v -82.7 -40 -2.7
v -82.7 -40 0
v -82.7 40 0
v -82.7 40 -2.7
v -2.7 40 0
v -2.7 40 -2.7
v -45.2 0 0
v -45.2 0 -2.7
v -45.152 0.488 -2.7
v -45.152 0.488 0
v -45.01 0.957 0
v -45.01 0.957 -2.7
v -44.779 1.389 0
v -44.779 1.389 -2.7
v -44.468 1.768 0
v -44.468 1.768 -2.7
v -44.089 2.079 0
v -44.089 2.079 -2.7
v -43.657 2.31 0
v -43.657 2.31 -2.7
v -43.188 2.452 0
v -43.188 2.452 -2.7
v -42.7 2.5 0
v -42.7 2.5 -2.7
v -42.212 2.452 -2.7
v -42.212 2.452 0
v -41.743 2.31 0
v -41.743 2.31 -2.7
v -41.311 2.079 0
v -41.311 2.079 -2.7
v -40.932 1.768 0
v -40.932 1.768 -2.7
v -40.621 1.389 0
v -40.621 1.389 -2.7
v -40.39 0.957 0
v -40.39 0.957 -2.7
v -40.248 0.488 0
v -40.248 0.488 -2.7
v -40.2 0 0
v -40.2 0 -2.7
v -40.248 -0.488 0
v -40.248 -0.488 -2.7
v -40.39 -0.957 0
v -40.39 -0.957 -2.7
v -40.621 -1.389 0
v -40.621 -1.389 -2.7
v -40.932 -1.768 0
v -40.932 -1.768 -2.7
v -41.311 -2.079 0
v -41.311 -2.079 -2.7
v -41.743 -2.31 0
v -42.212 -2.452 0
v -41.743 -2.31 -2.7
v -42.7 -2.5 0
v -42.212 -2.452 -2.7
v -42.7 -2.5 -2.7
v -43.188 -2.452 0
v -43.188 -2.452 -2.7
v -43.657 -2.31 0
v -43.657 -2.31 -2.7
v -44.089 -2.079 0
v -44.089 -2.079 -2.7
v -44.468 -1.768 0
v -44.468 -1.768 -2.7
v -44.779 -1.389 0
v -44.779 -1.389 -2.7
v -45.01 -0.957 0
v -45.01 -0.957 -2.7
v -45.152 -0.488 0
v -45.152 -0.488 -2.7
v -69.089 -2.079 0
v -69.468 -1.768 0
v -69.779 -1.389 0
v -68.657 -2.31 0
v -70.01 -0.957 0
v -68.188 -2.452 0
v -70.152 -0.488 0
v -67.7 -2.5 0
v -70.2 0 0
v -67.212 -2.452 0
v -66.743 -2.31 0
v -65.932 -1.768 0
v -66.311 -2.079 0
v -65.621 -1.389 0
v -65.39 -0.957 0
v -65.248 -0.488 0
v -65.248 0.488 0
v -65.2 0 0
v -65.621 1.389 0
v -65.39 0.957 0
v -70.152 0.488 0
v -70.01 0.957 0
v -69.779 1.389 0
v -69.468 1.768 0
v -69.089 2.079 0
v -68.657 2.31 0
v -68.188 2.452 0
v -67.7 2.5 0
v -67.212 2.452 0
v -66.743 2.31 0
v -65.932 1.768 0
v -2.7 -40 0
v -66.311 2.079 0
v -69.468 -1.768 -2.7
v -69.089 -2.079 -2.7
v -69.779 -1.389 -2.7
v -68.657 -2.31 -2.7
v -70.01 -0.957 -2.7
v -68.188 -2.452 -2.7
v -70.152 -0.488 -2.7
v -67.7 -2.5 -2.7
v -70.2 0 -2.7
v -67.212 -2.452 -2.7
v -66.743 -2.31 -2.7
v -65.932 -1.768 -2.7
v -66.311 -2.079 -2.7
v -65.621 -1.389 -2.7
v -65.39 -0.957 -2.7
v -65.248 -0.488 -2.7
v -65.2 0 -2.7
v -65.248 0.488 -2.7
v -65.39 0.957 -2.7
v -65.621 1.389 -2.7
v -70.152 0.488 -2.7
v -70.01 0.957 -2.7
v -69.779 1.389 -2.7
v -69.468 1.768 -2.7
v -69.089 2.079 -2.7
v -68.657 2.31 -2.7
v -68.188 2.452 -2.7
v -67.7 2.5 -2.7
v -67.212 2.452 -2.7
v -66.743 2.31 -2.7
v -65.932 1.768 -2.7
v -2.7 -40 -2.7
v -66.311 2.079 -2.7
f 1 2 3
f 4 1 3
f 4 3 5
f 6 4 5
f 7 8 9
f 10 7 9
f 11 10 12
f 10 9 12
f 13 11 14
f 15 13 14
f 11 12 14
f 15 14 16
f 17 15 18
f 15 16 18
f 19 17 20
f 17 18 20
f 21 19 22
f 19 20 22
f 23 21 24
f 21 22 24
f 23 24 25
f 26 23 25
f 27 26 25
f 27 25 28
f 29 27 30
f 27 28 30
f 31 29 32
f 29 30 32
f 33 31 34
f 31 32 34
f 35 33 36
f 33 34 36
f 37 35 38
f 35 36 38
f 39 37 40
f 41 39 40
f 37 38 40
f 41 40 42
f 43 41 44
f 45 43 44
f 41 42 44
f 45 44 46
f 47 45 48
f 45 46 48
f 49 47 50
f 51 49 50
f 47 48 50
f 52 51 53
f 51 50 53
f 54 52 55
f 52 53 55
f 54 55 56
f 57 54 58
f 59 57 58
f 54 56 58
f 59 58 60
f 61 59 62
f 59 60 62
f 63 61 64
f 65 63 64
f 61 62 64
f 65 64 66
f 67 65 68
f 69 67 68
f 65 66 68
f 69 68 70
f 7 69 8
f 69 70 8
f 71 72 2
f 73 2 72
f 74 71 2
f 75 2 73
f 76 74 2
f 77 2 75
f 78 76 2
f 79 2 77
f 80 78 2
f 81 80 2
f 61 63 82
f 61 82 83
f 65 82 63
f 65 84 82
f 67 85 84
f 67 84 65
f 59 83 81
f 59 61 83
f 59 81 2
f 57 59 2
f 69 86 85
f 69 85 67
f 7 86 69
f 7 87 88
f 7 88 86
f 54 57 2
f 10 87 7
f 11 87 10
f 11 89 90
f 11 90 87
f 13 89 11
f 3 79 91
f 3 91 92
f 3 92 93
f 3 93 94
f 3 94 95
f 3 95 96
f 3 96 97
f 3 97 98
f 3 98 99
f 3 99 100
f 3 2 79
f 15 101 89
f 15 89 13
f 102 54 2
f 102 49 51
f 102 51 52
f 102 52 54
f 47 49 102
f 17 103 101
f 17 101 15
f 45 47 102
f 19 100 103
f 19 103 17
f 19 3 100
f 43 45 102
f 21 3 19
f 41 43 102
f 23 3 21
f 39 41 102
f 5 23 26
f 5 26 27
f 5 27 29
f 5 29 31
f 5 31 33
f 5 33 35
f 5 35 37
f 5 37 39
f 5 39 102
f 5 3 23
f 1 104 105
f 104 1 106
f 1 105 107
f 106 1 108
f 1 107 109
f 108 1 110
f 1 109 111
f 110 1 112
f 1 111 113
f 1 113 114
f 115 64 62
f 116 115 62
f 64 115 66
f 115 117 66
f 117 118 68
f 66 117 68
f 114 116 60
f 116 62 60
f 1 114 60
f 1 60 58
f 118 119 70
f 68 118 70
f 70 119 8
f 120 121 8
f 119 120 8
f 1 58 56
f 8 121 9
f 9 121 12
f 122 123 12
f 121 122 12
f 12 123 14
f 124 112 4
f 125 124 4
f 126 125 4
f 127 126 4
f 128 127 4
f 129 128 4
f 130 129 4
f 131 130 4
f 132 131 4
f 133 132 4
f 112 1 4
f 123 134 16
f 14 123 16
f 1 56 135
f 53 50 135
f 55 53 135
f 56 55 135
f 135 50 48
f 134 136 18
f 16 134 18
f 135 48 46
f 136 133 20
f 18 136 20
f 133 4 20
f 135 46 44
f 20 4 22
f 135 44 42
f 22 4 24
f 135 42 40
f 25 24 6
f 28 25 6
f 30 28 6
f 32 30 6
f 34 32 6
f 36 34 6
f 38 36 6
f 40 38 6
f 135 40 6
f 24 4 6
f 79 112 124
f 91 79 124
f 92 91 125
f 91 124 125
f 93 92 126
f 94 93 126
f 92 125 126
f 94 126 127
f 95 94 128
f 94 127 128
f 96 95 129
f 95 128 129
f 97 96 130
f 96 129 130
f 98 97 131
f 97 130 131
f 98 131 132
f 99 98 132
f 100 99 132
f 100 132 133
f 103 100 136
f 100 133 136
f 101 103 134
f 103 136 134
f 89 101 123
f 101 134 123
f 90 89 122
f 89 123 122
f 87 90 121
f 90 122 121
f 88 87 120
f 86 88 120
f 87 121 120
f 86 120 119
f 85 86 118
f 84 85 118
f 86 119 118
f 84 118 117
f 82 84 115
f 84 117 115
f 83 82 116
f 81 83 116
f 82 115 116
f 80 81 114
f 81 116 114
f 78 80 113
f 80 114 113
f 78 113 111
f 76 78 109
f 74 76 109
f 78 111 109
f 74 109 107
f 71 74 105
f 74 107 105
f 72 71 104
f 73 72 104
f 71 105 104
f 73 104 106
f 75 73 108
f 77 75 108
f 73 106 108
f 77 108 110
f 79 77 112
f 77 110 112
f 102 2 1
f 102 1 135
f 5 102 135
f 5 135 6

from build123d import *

# Parameters (mm, degrees)
CROQUIS1_W              = 80
CROQUIS1_H              = 80
SALIENTE_EXTRUIR2_DEPTH = 2.7
CROQUIS2_R              = 2.5
CORTAR_EXTRUIR1_DEPTH   = 2.7


with BuildPart() as part:
    # Croquis1 → Saliente-Extruir2 (new body)
    with BuildSketch(Plane.XY):
        with Locations((-42.7, 0)):
            Rectangle(CROQUIS1_W, CROQUIS1_H)
    extrude(amount=-SALIENTE_EXTRUIR2_DEPTH)

    # Croquis2 → Cortar-Extruir1 (cut)
    with BuildSketch(Plane(origin=(0, 0, -2.7), x_dir=(-1, 0, 0), z_dir=(0, 0, -1))):
        with Locations((67.7, 0)):
            Circle(CROQUIS2_R)
        with Locations((42.7, 0)):
            Circle(CROQUIS2_R)
    extrude(amount=-CORTAR_EXTRUIR1_DEPTH, mode=Mode.SUBTRACT)


solid = part.part
